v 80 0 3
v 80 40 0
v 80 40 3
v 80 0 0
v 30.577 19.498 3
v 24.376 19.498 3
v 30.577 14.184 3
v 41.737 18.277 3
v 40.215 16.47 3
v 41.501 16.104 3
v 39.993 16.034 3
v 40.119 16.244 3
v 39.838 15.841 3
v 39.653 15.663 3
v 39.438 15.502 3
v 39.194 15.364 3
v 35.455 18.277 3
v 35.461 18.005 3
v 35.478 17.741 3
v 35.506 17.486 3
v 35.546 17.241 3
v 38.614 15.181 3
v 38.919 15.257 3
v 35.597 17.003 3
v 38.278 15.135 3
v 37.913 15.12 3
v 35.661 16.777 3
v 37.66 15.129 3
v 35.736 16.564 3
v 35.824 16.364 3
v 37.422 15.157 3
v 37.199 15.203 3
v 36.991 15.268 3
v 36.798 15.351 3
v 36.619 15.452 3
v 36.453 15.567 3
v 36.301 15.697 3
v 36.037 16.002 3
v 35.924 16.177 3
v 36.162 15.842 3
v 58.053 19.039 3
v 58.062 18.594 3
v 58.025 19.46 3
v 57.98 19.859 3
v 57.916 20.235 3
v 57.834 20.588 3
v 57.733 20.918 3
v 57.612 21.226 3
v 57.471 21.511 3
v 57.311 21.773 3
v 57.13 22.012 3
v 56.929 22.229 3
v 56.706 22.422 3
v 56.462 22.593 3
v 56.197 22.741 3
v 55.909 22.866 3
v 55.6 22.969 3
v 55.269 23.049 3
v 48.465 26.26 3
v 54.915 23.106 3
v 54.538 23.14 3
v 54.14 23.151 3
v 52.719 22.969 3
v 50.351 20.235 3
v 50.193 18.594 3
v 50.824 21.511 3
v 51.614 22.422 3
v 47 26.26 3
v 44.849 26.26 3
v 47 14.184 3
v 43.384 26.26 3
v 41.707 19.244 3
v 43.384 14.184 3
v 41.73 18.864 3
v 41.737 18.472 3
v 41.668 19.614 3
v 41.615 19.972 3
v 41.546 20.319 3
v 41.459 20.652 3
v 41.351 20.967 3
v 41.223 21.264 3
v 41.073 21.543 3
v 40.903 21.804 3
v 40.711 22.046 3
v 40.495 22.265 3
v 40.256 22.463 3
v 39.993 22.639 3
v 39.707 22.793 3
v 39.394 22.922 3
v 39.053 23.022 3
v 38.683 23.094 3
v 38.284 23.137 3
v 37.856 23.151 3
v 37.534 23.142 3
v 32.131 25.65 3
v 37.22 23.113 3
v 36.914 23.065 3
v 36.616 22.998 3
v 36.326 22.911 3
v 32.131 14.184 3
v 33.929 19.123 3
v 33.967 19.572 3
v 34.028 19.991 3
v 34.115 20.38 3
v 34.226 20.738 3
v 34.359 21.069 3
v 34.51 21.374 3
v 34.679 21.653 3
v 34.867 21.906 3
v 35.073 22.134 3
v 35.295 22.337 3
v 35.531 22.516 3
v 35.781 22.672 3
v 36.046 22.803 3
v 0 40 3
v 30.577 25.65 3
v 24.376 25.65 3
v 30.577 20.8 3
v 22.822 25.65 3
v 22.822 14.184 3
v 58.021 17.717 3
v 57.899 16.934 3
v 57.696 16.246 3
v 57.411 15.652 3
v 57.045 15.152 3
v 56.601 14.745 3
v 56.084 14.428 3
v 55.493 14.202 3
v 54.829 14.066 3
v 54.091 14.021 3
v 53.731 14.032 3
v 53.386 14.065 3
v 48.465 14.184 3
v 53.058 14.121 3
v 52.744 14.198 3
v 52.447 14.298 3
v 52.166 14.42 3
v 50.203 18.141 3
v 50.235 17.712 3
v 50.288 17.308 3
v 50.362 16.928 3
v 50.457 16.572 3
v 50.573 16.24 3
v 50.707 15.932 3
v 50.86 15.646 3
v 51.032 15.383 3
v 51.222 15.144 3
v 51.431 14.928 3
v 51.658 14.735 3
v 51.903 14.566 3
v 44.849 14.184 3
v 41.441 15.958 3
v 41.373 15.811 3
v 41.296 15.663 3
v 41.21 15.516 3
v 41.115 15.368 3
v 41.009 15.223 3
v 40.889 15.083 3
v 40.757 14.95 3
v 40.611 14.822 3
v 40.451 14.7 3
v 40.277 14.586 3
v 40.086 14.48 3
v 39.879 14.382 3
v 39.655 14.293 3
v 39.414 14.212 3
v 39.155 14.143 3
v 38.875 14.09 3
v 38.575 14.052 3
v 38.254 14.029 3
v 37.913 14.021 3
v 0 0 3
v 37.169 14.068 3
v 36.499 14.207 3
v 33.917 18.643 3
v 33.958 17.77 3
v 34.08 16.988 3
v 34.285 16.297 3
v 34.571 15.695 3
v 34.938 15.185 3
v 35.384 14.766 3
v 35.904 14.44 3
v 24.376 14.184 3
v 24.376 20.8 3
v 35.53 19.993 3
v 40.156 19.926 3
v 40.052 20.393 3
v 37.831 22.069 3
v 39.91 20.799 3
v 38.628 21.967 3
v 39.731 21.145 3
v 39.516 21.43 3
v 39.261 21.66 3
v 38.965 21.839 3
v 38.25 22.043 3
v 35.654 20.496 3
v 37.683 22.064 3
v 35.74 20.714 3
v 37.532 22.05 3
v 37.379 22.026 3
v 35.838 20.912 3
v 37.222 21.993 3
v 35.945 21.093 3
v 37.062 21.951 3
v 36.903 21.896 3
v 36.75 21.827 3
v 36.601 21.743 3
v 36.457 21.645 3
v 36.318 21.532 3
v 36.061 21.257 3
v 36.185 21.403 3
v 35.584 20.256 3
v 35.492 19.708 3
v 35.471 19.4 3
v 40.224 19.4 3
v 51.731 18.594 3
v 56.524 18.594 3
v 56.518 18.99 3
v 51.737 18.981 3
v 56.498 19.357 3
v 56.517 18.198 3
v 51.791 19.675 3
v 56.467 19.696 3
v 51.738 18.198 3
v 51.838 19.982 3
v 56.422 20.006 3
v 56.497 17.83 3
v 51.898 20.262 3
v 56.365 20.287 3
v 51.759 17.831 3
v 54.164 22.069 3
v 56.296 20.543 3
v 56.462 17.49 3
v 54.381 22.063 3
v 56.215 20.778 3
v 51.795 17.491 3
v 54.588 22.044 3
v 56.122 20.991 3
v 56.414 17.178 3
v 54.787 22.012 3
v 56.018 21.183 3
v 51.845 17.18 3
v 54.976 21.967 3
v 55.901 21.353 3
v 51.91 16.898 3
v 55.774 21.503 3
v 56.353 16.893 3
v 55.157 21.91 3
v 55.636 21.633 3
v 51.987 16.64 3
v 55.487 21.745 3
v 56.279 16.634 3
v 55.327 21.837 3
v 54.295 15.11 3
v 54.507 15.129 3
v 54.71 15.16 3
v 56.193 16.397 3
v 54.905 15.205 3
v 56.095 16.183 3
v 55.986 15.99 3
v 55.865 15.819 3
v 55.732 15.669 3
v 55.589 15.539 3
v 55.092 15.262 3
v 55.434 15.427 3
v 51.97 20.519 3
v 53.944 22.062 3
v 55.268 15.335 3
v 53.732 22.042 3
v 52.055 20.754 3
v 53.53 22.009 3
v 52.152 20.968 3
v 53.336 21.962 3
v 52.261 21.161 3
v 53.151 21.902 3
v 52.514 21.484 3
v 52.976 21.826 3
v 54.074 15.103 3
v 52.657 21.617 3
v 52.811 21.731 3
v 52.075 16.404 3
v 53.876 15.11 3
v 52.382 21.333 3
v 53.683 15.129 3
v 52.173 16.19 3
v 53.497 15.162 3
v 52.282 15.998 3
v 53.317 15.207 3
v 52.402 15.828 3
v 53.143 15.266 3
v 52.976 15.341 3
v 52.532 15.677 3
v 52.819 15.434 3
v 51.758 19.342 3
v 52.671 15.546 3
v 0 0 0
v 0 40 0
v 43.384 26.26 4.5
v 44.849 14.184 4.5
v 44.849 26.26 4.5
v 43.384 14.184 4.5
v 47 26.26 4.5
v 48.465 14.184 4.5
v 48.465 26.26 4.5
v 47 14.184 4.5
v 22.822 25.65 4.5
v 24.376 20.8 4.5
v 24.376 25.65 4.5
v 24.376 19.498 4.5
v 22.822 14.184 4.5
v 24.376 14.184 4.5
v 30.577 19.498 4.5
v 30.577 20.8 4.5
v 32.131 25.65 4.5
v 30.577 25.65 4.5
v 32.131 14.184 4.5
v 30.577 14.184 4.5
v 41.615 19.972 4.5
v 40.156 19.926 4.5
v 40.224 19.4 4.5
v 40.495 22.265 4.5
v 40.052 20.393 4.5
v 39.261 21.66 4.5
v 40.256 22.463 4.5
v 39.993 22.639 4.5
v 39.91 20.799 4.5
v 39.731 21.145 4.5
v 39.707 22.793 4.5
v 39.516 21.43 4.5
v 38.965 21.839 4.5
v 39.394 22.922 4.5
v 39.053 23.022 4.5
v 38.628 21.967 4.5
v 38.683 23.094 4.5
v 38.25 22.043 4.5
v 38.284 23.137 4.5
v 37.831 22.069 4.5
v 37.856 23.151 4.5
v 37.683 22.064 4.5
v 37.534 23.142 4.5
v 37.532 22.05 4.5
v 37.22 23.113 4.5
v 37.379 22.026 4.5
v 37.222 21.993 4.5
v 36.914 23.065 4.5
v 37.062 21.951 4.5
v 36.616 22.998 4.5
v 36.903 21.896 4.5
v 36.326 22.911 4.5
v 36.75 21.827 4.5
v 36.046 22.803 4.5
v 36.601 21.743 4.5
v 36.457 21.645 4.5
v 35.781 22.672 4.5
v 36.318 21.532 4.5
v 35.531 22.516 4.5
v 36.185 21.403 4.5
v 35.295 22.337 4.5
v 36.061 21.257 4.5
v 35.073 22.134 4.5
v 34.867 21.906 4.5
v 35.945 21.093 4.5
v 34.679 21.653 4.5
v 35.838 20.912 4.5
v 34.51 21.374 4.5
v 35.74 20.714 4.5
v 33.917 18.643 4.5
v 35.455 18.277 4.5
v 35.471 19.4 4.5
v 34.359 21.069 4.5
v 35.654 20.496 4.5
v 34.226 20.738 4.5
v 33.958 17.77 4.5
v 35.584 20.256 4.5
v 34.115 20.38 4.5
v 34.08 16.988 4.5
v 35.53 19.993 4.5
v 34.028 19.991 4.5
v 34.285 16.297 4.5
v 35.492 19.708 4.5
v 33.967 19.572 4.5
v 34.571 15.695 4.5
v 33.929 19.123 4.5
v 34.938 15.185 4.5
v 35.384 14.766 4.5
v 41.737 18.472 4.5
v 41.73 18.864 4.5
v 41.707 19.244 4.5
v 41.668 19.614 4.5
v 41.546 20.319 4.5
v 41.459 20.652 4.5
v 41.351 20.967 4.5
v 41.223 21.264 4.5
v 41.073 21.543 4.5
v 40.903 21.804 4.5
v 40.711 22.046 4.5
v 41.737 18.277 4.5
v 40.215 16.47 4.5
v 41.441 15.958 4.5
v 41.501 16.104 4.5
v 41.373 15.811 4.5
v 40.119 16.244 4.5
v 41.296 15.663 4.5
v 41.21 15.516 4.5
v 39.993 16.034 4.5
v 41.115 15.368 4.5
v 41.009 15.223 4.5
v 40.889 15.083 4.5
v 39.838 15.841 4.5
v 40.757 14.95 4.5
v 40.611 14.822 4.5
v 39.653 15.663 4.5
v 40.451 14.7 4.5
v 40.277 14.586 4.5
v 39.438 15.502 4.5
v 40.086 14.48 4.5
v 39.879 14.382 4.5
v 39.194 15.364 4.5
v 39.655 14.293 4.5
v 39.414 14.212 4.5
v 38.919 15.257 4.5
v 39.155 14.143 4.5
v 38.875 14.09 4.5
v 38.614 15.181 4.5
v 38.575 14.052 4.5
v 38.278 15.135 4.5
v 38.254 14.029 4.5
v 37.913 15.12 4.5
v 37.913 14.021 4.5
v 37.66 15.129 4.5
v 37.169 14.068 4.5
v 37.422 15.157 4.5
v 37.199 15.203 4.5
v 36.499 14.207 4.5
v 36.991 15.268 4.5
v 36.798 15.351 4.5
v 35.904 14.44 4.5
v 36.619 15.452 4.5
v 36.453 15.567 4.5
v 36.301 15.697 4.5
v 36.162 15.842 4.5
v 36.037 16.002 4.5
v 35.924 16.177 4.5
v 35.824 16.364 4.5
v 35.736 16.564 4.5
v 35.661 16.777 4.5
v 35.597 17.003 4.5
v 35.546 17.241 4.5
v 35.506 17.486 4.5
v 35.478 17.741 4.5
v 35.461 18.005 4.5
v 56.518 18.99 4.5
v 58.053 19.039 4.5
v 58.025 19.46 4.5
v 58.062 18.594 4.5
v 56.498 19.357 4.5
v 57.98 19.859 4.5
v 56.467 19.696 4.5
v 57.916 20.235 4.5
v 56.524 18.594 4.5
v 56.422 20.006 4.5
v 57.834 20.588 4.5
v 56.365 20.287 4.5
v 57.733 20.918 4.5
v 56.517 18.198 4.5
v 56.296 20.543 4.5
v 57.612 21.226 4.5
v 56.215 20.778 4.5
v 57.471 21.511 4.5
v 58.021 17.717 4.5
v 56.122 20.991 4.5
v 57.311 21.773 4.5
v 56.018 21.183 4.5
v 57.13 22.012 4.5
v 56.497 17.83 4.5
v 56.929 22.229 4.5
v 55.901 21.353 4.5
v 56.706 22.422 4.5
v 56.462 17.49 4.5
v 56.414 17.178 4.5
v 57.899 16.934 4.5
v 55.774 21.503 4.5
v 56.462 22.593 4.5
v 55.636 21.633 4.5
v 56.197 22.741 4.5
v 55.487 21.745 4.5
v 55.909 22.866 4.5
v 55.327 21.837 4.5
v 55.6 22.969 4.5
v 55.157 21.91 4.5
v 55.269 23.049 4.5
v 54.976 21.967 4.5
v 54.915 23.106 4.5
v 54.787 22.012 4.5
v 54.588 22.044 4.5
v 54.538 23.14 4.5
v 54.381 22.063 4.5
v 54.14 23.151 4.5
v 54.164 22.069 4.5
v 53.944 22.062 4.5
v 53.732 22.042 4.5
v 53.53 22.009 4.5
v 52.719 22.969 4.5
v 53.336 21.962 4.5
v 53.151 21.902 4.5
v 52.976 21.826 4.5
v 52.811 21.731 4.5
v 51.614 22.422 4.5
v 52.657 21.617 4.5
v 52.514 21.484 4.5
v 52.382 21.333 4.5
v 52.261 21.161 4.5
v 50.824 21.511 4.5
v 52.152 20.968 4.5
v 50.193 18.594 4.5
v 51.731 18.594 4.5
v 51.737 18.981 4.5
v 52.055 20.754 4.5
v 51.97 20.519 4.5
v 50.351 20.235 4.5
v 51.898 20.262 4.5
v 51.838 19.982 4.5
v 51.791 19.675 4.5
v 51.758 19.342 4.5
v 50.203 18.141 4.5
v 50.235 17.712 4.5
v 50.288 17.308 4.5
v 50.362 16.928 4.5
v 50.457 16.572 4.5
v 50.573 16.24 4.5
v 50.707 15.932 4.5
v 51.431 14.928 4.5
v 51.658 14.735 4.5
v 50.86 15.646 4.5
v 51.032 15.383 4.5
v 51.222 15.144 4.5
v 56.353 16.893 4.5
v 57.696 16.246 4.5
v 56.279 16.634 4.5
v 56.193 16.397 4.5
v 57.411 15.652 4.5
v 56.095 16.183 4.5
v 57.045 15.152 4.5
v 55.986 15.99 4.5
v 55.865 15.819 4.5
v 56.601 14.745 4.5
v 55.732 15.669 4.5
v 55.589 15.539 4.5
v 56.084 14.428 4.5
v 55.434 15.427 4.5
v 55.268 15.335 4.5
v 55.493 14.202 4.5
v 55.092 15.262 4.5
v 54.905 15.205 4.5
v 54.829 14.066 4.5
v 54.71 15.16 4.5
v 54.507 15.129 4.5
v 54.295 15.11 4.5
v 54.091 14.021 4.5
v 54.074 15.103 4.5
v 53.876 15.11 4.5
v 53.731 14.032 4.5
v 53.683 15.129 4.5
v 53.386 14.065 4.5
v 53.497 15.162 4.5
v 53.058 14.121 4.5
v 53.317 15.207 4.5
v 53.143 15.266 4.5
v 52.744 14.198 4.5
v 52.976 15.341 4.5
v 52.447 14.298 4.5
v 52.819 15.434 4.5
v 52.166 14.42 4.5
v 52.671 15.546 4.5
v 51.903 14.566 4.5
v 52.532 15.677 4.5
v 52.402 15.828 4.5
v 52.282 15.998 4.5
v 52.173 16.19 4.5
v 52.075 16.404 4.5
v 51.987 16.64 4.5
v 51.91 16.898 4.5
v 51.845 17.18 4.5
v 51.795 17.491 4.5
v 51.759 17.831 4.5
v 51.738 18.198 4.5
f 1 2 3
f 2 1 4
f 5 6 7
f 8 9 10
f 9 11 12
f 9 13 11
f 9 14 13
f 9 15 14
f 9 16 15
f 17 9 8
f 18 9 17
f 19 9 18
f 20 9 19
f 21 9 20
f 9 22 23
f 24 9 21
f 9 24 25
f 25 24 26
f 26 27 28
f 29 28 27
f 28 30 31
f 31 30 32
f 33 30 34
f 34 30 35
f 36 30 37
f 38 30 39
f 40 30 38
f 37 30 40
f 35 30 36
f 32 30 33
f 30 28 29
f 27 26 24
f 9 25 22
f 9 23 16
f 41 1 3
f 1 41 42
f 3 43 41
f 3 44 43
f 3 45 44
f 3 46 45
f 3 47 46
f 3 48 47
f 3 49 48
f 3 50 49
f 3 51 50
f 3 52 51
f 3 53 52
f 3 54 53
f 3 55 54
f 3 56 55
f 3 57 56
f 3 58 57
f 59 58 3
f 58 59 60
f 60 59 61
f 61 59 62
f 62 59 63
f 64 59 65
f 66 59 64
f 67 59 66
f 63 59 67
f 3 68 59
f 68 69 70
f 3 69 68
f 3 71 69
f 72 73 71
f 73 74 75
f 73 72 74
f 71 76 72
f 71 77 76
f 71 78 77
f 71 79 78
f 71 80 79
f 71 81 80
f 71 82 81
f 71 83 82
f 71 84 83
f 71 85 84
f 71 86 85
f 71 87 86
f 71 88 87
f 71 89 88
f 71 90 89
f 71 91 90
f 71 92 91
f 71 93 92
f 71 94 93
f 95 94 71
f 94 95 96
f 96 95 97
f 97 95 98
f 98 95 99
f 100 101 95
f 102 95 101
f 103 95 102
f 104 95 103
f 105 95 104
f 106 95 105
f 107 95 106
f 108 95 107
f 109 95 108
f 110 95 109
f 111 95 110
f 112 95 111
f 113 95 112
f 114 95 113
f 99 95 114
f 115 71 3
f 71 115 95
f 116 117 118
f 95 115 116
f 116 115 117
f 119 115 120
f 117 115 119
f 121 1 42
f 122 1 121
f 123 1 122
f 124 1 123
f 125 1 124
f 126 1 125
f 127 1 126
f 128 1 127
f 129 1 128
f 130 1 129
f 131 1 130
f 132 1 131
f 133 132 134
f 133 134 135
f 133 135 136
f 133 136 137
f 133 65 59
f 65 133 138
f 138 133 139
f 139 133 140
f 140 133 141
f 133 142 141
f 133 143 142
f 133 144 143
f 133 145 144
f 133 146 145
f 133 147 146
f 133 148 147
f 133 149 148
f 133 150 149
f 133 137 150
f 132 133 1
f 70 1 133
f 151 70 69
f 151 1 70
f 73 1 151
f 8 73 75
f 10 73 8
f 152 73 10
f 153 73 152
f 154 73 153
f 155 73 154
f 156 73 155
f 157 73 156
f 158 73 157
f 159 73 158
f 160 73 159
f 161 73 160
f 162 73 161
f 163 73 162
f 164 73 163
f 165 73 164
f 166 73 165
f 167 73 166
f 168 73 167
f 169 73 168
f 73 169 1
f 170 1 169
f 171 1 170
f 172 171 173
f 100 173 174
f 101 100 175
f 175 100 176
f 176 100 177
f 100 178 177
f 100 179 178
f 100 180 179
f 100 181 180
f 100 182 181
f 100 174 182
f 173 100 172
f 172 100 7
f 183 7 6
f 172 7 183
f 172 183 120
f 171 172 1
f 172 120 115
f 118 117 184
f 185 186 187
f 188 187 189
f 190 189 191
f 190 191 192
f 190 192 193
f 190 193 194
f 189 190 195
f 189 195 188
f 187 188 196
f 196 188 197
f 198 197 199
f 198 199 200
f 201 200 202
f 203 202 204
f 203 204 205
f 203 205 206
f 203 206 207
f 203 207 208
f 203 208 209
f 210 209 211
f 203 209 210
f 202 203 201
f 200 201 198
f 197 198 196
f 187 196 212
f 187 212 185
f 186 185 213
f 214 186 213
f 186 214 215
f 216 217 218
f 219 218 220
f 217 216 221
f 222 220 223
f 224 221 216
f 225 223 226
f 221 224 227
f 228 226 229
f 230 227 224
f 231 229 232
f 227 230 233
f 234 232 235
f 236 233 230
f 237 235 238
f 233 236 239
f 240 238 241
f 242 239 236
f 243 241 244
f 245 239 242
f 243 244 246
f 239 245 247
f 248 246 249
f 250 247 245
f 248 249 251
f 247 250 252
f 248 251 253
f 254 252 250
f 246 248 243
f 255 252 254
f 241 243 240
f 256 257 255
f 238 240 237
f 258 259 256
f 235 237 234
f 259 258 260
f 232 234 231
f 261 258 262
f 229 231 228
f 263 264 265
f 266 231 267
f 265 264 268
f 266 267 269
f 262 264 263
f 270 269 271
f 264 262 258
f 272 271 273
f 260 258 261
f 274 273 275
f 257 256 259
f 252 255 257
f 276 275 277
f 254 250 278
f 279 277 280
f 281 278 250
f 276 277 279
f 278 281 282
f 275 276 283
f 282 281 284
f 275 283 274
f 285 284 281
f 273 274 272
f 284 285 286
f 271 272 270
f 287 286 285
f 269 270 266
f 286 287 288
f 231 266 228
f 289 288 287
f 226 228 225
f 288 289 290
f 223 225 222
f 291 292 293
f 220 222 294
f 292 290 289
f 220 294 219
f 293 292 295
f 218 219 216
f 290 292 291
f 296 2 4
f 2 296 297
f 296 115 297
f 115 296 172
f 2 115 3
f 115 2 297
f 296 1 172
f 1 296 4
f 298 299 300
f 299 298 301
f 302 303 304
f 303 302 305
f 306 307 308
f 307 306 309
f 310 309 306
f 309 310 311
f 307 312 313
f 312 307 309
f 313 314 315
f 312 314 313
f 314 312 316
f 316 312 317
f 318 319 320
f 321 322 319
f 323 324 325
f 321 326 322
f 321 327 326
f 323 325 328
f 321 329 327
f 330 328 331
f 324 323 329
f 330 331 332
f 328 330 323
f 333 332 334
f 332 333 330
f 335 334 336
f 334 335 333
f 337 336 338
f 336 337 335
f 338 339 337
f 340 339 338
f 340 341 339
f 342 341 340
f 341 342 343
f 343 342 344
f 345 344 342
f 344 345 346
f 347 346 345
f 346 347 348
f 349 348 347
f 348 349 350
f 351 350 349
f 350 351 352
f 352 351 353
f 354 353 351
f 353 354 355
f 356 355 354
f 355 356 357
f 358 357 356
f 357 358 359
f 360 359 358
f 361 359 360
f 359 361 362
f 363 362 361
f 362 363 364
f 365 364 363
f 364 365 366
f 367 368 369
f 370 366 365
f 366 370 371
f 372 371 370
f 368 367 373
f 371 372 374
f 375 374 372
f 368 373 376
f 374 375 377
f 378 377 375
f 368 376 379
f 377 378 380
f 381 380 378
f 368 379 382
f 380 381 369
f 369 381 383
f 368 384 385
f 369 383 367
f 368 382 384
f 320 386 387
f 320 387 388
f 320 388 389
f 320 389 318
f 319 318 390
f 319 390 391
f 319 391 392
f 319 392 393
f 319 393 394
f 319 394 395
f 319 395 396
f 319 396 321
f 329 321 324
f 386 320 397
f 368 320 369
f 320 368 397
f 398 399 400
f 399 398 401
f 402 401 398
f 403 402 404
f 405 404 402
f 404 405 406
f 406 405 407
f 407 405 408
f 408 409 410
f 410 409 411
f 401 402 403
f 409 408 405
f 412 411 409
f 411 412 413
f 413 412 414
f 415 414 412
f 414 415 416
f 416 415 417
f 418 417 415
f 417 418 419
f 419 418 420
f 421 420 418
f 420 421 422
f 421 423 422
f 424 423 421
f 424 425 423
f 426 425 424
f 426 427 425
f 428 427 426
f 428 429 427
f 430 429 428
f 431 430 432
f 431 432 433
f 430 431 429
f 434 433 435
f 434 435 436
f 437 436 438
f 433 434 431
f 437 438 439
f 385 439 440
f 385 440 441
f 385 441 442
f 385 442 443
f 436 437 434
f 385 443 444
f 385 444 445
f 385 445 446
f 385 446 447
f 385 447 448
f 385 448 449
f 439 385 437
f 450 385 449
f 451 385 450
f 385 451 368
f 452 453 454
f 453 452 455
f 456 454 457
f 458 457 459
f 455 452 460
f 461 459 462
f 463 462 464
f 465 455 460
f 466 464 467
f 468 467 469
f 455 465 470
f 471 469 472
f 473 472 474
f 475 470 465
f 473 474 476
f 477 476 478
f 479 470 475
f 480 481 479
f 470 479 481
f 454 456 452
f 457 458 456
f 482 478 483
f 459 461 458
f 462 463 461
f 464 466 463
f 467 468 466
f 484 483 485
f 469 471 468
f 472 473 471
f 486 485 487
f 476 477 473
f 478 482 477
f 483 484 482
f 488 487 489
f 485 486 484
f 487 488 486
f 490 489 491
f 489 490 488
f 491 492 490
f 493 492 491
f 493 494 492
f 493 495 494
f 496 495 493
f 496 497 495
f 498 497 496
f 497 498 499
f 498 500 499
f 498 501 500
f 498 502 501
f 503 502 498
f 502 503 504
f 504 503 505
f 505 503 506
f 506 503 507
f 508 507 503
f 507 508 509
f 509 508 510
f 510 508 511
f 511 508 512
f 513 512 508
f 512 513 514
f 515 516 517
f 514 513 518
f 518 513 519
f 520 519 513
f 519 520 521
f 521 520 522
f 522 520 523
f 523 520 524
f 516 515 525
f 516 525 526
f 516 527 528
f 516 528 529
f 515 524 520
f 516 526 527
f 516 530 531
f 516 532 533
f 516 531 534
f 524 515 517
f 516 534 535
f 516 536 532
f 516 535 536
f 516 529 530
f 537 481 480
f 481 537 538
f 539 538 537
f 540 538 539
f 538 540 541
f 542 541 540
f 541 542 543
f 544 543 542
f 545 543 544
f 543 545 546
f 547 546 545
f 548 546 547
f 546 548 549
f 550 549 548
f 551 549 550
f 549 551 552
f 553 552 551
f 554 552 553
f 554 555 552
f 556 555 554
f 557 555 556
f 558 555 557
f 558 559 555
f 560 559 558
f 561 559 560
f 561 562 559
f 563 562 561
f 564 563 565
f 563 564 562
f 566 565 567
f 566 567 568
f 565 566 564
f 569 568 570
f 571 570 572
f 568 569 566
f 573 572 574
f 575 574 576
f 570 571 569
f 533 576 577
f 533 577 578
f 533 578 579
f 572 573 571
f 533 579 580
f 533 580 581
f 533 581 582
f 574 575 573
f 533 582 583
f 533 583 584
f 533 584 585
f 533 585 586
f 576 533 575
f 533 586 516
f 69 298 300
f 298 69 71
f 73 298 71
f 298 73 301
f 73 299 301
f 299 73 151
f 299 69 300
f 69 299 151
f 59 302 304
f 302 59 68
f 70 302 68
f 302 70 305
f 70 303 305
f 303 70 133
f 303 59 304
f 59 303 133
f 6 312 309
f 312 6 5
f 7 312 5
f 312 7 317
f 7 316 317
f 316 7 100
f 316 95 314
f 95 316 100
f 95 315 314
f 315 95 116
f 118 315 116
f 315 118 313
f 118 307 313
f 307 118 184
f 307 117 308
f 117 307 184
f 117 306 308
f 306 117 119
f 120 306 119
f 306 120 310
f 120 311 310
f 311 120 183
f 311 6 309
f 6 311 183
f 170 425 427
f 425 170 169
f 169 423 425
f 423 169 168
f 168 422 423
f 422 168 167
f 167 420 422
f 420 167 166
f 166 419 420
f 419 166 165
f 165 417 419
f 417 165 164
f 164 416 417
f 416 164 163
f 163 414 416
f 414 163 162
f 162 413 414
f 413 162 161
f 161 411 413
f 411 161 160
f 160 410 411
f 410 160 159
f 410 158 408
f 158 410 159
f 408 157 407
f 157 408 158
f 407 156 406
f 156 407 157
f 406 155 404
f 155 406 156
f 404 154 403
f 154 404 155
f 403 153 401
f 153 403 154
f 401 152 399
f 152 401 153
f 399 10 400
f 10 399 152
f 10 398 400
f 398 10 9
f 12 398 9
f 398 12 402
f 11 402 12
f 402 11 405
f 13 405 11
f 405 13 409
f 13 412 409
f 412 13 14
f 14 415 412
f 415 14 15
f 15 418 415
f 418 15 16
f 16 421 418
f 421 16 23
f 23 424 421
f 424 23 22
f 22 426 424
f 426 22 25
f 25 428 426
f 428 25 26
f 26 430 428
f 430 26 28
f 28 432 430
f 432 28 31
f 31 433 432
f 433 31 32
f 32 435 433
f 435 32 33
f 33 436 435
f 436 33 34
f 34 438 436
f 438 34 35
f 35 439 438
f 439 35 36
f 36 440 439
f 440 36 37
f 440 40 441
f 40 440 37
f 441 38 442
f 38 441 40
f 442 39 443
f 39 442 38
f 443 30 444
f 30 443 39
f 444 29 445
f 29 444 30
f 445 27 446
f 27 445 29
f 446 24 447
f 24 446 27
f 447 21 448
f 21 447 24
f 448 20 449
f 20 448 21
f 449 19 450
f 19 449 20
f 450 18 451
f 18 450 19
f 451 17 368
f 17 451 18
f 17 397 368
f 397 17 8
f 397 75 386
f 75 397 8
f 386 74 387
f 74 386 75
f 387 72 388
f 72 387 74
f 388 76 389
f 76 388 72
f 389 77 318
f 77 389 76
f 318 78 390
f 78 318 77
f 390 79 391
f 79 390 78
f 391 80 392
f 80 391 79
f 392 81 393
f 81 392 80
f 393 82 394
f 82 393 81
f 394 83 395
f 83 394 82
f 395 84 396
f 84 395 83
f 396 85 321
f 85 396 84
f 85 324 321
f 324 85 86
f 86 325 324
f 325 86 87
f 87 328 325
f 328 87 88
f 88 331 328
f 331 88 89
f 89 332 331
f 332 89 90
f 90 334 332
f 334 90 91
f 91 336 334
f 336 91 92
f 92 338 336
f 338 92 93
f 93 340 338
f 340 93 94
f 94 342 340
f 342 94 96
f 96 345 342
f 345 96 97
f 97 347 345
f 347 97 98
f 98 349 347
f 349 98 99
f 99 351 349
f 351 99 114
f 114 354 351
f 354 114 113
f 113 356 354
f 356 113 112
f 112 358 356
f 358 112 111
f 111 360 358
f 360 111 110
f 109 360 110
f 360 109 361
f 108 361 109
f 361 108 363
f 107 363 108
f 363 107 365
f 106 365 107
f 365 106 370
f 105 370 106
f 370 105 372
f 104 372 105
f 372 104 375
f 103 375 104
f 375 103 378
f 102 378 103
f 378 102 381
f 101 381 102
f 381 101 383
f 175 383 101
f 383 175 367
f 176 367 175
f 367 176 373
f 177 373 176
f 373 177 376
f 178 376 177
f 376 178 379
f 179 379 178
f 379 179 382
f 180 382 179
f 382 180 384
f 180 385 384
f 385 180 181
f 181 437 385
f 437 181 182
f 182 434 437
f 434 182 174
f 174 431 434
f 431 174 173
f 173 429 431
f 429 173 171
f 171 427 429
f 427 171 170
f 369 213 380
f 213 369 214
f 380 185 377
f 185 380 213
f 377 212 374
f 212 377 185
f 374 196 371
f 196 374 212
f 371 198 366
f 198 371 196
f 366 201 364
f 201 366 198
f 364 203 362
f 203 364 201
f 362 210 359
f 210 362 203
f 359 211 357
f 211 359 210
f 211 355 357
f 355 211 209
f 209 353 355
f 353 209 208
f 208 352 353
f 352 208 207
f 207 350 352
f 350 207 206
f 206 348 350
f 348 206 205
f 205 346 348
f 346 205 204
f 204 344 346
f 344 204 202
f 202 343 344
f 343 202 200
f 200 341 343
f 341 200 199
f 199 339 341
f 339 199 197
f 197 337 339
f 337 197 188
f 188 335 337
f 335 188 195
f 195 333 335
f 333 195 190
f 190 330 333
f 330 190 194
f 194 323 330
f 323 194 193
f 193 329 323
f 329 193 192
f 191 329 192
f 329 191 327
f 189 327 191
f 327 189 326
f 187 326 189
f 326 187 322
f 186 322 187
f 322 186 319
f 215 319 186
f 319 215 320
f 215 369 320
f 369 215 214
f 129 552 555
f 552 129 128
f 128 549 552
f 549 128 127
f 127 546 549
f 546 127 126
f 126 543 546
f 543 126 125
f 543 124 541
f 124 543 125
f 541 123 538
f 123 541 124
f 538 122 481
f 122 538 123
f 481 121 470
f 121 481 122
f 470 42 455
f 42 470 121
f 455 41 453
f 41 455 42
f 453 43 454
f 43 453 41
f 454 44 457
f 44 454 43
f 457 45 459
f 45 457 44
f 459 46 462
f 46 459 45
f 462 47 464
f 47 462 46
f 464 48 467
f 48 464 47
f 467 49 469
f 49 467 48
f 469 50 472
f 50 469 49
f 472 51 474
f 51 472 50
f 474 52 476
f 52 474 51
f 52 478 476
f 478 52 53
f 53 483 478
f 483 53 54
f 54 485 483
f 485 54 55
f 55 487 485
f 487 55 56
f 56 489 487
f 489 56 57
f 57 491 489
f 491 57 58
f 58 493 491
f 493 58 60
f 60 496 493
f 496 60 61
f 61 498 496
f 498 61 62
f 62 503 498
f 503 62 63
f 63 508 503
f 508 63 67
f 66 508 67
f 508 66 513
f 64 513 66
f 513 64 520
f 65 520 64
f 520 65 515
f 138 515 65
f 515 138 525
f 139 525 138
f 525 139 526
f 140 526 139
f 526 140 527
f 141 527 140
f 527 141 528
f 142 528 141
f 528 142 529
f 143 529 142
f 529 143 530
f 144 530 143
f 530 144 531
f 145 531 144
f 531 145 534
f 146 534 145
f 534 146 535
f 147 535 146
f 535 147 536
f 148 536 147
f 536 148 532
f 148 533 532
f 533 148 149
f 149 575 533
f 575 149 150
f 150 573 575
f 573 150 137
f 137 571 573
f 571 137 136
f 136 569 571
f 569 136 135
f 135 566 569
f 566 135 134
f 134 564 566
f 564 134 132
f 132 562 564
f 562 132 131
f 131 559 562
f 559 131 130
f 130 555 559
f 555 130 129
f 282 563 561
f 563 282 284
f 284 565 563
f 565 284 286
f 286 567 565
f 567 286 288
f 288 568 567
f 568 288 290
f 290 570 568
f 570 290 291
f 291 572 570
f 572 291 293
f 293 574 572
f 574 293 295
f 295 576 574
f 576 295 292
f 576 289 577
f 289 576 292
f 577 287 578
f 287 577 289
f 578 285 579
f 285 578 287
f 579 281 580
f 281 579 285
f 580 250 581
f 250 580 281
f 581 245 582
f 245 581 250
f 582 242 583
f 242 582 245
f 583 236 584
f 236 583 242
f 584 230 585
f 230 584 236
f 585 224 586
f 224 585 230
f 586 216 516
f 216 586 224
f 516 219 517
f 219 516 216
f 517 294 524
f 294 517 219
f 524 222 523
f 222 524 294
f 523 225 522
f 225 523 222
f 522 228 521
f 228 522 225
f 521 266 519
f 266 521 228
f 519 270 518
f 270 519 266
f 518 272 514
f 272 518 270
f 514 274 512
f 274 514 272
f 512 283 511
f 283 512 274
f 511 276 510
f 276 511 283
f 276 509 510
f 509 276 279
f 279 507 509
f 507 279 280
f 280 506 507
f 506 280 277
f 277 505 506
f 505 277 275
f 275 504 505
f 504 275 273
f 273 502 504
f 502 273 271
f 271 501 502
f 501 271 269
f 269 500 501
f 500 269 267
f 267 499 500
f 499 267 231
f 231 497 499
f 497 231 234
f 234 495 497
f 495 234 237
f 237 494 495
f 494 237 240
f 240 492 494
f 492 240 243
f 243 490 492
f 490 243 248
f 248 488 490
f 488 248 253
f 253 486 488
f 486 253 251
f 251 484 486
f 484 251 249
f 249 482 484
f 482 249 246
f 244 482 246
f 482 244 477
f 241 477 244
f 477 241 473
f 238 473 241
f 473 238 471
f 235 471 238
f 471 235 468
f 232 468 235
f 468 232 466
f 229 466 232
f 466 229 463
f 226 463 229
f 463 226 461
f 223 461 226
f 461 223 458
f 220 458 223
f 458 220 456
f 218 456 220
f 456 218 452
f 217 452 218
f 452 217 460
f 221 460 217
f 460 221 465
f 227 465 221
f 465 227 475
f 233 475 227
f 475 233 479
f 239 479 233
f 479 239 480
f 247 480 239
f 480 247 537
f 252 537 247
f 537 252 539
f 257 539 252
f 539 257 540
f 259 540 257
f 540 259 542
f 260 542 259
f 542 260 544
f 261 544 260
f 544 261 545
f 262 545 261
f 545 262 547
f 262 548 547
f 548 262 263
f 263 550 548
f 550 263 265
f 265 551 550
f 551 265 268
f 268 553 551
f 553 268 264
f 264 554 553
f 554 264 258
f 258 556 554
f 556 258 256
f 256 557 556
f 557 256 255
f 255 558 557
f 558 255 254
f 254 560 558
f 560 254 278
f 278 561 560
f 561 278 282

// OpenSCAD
// Qubic wrapper — Text Plaque
// Rectangular base with raised or inset text

message = "Hello";
font_size = 12;
text_depth = 1.5;
base_width = 80;
base_height = 40;
base_thickness = 3;
raised = true;
fn = 0;
render_mode = 0;

$fn = fn > 0 ? fn : 32;

if (raised) {
    // Raised text: base + extruded text on top
    union() {
        cube([base_width, base_height, base_thickness]);
        translate([base_width / 2, base_height / 2, base_thickness])
            linear_extrude(text_depth)
                text(message, size = font_size, halign = "center", valign = "center");
    }
} else {
    // Inset text: base with text carved in
    difference() {
        cube([base_width, base_height, base_thickness]);
        translate([base_width / 2, base_height / 2, base_thickness - text_depth])
            linear_extrude(text_depth + 0.1)
                text(message, size = font_size, halign = "center", valign = "center");
    }
}
